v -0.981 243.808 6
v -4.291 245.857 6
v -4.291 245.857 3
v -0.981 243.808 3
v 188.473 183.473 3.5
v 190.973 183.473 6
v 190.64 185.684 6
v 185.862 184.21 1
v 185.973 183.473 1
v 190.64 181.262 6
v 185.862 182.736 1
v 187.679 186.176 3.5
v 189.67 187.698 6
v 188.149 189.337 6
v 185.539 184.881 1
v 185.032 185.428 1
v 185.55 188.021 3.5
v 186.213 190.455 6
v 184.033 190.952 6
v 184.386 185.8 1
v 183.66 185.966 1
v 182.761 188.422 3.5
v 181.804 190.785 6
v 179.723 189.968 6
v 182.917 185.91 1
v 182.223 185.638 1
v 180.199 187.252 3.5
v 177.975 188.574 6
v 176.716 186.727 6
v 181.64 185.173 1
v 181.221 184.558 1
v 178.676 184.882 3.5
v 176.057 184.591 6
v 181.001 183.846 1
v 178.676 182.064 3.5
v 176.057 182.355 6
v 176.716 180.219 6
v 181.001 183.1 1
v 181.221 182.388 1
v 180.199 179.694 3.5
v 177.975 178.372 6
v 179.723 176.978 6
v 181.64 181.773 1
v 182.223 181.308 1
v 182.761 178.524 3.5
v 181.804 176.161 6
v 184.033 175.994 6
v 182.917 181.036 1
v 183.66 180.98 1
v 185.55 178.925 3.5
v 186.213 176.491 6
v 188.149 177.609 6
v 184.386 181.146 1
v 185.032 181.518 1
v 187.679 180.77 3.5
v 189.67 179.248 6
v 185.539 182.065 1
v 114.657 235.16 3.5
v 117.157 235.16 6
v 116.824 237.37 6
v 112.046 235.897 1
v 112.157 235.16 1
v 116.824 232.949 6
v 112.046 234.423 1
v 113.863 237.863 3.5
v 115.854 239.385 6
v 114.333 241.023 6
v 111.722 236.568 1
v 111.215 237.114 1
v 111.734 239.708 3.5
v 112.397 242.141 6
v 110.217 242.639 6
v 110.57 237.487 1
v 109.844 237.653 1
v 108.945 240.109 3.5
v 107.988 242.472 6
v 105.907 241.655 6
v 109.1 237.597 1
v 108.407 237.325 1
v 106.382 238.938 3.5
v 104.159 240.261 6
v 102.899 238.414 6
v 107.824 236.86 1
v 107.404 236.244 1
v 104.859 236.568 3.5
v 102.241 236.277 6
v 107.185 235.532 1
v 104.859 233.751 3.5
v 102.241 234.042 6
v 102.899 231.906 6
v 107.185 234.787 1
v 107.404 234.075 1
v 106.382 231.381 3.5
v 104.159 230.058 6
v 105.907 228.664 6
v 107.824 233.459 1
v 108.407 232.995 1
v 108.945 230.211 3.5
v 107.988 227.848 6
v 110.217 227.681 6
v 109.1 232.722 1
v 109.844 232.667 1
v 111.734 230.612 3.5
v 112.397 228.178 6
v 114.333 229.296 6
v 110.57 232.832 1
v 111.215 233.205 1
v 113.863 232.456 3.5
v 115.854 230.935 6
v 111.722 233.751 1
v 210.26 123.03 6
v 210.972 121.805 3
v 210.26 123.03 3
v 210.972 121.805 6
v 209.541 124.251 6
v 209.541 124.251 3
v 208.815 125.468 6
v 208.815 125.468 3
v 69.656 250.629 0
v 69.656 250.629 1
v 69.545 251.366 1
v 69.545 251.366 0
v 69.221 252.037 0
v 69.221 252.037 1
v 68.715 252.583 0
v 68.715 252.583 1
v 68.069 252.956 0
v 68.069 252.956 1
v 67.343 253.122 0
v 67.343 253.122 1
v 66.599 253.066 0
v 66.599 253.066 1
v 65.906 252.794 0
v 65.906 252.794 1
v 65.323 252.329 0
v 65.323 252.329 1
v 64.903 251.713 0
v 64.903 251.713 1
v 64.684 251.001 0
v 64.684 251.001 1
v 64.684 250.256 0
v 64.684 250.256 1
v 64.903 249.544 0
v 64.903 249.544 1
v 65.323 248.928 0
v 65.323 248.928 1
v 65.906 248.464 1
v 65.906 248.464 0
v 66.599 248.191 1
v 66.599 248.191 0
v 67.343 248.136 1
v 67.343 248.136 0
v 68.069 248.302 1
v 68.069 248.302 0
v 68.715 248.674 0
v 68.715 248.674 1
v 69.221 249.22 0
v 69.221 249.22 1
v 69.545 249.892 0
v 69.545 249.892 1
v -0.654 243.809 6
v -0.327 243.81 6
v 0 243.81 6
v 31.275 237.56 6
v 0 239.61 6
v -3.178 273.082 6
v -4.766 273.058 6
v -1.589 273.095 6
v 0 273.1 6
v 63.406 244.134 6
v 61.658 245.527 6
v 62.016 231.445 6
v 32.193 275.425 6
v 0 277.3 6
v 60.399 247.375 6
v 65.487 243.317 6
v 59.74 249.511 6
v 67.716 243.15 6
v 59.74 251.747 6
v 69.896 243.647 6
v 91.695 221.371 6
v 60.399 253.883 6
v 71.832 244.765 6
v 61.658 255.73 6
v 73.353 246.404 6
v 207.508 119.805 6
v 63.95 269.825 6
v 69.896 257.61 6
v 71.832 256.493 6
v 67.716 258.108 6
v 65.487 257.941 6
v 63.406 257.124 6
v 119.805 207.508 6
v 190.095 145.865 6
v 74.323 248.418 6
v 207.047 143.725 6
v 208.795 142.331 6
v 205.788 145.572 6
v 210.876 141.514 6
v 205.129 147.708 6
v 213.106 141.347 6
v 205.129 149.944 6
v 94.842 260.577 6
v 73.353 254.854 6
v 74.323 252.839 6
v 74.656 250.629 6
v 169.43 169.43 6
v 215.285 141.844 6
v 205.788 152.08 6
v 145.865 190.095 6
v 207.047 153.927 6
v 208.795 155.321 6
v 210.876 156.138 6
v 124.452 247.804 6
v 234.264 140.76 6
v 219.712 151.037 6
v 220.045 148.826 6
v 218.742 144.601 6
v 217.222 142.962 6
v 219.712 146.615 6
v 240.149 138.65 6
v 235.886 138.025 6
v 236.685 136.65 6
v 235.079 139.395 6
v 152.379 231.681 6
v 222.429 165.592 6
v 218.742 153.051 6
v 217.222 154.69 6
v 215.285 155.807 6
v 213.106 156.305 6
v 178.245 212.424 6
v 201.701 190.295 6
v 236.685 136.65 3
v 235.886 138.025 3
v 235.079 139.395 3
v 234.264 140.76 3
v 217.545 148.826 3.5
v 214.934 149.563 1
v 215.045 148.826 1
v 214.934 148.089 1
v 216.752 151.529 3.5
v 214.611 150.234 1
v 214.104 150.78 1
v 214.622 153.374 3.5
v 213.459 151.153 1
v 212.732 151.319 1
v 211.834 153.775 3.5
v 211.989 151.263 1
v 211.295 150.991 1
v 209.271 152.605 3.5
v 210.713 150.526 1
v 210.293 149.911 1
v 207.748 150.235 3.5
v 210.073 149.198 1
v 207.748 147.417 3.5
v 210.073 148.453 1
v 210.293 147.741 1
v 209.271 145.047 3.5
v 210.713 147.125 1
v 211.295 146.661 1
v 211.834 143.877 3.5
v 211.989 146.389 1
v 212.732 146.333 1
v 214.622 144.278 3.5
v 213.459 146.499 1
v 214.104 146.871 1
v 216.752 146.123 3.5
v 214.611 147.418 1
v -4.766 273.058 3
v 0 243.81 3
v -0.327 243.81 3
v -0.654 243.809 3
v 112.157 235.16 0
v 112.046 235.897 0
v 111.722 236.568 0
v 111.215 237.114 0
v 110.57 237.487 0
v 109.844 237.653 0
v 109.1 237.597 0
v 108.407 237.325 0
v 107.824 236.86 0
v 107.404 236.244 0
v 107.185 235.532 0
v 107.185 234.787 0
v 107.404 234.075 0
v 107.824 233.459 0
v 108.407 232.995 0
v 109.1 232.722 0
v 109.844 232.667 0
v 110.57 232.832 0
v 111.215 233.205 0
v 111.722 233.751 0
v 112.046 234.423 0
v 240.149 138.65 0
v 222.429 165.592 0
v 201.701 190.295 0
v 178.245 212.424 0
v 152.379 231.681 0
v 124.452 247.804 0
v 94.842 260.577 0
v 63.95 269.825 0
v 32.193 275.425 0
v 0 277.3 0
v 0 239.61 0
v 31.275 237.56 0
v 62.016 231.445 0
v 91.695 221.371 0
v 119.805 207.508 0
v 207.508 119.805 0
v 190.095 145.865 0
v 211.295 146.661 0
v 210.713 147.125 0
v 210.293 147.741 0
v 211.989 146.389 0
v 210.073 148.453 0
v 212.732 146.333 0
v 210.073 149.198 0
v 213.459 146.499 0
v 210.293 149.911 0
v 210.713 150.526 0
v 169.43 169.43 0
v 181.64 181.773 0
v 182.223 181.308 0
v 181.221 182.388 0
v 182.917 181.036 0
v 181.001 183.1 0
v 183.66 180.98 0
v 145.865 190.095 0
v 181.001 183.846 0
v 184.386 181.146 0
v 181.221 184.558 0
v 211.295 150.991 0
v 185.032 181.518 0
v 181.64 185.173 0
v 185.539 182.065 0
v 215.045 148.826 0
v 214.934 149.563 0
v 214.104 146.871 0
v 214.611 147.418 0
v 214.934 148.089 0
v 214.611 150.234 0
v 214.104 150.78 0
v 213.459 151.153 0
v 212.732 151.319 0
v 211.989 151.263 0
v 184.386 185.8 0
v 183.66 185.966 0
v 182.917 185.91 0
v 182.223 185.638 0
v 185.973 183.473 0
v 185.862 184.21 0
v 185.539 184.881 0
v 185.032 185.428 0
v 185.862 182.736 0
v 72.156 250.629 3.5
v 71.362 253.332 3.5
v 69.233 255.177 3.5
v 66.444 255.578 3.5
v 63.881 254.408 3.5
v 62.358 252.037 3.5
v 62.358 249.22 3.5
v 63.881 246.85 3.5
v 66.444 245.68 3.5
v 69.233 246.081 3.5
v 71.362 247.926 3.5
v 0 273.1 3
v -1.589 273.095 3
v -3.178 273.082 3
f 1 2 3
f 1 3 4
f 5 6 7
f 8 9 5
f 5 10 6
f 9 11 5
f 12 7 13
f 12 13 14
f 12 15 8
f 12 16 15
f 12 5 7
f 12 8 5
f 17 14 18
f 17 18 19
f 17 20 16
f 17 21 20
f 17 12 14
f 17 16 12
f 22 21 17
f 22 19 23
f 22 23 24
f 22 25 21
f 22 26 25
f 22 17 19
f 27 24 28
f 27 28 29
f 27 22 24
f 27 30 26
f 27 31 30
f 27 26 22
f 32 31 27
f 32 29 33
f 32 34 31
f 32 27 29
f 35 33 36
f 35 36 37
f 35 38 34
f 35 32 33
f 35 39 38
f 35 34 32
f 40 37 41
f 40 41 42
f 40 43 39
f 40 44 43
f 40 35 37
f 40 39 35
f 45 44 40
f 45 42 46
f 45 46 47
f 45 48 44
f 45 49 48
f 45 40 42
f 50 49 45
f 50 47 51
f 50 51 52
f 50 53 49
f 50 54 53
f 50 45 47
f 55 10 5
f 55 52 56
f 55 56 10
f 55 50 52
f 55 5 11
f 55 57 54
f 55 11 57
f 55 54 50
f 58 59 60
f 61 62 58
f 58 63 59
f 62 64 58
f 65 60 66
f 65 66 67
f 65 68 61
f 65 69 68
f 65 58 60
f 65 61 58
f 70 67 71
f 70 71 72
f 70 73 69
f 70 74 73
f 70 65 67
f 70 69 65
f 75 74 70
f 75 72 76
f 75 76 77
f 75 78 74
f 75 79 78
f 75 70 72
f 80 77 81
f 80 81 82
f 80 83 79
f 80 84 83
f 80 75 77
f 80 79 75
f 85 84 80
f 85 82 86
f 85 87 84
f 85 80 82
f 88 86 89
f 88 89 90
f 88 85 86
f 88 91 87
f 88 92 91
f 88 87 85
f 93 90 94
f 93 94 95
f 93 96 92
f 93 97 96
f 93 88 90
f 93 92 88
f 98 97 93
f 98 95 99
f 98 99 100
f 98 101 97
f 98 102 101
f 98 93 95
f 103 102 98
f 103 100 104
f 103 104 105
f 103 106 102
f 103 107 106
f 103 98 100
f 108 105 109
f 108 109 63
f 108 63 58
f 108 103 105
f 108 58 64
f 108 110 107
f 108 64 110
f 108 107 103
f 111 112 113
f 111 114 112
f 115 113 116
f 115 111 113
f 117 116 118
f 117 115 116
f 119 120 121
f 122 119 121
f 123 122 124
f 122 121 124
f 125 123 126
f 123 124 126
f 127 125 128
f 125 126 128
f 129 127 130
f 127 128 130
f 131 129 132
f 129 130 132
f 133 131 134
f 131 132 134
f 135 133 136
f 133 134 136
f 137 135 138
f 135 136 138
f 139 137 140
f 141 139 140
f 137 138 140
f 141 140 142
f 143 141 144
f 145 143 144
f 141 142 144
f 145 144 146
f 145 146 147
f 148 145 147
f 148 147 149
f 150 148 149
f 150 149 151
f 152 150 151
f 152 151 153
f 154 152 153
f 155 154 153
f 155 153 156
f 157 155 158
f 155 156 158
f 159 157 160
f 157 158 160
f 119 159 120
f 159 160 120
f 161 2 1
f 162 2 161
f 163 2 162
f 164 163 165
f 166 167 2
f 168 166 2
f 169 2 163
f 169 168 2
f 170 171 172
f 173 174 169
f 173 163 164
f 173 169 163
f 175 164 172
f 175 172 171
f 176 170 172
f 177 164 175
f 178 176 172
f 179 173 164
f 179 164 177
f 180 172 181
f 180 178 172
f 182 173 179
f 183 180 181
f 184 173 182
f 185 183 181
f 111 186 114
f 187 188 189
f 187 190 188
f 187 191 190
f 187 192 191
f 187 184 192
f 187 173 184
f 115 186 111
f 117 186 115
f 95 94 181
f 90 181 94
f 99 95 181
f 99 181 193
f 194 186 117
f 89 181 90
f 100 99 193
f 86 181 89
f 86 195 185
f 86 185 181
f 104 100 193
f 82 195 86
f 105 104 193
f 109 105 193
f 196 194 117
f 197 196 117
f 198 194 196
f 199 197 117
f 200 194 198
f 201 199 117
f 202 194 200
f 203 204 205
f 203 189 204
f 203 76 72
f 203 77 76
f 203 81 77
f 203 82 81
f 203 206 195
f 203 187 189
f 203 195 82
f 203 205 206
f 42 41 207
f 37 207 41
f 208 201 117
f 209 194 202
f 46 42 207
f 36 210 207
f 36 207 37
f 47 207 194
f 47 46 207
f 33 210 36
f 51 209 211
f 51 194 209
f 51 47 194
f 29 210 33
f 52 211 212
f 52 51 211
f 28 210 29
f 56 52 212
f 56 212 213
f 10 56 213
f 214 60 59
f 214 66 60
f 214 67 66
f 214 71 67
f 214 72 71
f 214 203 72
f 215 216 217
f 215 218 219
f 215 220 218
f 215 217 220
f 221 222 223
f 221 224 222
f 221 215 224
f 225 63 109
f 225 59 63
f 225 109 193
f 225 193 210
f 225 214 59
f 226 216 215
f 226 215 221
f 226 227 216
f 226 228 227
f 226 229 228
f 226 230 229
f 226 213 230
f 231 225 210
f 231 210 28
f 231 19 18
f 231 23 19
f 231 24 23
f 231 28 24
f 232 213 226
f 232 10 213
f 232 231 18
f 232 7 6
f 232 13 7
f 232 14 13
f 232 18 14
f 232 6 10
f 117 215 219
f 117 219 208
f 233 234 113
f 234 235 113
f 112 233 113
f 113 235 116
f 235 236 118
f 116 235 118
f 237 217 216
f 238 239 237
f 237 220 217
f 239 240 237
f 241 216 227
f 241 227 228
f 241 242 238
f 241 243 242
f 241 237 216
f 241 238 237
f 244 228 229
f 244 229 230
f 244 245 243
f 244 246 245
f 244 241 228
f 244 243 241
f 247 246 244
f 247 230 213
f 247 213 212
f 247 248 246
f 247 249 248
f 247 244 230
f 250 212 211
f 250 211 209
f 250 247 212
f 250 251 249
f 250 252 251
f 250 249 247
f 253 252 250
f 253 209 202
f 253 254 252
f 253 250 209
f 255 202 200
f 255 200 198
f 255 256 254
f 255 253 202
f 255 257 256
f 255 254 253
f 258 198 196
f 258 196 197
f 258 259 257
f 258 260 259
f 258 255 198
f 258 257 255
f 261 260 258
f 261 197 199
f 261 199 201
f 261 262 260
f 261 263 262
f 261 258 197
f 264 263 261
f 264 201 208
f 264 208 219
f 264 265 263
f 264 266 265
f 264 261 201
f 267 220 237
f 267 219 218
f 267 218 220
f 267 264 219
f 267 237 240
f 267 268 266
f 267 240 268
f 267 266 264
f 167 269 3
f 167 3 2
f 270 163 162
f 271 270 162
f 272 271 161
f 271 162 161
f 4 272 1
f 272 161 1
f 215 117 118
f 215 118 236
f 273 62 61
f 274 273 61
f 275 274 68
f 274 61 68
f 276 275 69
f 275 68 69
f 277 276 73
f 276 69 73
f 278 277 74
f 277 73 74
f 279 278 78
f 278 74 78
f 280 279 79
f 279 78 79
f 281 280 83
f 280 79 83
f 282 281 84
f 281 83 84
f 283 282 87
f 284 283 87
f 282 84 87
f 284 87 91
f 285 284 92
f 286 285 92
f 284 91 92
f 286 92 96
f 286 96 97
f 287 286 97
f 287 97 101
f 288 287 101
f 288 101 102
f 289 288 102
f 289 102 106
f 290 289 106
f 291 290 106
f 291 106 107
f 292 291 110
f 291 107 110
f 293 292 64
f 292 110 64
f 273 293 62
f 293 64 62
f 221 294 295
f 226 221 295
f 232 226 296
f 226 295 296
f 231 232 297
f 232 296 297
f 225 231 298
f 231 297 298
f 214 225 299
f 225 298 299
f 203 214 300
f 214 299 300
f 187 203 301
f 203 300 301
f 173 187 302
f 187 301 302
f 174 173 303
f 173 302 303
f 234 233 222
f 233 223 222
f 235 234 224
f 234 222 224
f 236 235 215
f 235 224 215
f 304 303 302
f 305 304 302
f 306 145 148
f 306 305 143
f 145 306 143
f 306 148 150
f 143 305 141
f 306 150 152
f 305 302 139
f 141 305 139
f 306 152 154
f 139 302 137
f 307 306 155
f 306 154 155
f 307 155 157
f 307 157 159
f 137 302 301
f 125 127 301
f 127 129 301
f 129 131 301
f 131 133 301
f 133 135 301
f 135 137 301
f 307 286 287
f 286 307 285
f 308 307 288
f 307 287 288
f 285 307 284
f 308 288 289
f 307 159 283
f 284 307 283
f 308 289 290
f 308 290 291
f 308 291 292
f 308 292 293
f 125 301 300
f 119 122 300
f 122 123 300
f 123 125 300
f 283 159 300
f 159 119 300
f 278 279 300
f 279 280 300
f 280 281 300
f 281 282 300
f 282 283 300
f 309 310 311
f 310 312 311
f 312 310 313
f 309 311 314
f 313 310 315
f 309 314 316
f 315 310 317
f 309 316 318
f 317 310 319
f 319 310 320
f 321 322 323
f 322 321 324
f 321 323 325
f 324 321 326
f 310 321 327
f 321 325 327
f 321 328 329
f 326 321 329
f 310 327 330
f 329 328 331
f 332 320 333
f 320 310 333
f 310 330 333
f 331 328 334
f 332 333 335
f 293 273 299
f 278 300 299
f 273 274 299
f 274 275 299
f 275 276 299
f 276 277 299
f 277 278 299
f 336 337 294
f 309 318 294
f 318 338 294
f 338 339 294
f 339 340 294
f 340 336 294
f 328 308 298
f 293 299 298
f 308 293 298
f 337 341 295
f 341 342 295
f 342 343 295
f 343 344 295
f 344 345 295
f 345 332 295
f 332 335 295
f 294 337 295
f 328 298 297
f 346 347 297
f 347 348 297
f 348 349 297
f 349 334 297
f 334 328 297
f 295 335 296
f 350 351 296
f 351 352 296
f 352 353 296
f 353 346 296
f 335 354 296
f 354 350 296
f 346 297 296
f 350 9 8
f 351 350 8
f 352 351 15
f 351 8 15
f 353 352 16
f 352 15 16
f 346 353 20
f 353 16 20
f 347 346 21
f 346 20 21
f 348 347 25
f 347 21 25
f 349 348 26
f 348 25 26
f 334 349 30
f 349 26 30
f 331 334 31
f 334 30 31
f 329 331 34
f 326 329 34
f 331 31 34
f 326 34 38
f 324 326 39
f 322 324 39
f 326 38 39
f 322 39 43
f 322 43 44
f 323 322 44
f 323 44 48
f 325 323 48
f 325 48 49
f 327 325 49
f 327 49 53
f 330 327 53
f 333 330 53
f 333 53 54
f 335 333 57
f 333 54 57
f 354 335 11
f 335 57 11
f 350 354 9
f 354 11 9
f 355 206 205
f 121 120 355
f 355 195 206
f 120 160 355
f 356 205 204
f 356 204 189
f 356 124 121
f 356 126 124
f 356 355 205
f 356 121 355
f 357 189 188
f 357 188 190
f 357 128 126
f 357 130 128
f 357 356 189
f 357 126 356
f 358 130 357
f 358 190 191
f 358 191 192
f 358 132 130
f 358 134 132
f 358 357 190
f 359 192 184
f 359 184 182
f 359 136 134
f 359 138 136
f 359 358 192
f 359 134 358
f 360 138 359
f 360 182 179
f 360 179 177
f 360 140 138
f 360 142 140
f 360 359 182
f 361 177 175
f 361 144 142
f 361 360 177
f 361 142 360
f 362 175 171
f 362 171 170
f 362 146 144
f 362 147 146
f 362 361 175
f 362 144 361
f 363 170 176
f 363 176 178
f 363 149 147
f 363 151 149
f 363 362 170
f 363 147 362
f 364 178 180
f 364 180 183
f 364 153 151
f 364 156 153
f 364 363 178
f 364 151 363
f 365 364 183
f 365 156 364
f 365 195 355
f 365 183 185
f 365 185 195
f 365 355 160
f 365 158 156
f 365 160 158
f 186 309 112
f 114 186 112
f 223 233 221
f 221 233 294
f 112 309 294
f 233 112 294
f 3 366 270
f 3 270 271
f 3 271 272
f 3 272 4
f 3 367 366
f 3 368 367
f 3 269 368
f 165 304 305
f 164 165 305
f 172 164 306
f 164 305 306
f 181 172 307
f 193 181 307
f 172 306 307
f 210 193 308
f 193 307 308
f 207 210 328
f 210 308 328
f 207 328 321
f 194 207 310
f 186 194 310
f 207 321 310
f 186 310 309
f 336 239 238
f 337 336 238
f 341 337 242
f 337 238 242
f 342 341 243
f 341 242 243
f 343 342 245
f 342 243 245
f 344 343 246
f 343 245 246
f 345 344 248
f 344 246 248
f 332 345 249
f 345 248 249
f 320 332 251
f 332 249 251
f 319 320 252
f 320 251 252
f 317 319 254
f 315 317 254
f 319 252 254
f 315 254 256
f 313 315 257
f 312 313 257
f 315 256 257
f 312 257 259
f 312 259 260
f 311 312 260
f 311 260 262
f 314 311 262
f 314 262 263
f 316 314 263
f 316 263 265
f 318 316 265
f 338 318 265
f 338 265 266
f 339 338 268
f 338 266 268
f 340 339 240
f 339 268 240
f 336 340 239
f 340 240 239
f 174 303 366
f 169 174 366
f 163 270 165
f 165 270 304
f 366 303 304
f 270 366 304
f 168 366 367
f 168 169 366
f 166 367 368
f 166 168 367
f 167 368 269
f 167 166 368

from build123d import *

# Parameters (mm, degrees)
BOSS_EXTRU_1_DEPTH                      = 6
ESQUISSE2_R                             = 2.5
ENL_V_MAT_EXTRU_1_DEPTH                 = 6
CHANFREIN1_SIZE                         = 5
ESQUISSE6_W                             = 29.69
ESQUISSE6_H                             = 3
ENL_VEMENT_DE_MATI_RE_R_VOLUTION1_ANGLE = 1
ESQUISSE7_W                             = 3
ESQUISSE7_H                             = 29.29
R_VOLUTION2_ANGLE                       = 1
ENL_V_MAT_EXTRU_2_DEPTH                 = 10


with BuildPart() as part:
    # Esquisse1 → Boss.-Extru.1 (new body)
    with BuildSketch(Plane.XY):
        with BuildLine():
            Line((0, 277.3), (0, 239.61))
            ThreePointArc((0, 239.61), (119.805, 207.508347001), (207.508347001, 119.805))
            Line((207.508347001, 119.805), (240.148844469, 138.65))
            ThreePointArc((240.148844469, 138.65), (138.65, 240.148844469), (0, 277.3))
        make_face()
    extrude(amount=BOSS_EXTRU_1_DEPTH)

    # Esquisse2 → Enlèv. mat.-Extru.1 (cut)
    with BuildSketch(Plane.XY.offset(6)):
        with Locations((67.155777633, 250.628774147)):
            Circle(ESQUISSE2_R)
        with Locations((109.656760374, 235.159681502)):
            Circle(ESQUISSE2_R)
        with Locations((212.545380932, 148.82587794)):
            Circle(ESQUISSE2_R)
        with Locations((183.472996514, 183.472996514)):
            Circle(ESQUISSE2_R)
    extrude(amount=-ENL_V_MAT_EXTRU_1_DEPTH, mode=Mode.SUBTRACT)

    # Chanfrein1
    chanfrein1_edges = [part.edges().sort_by_distance(p)[0] for p in [
        (64.655777633, 250.628774147, 6),
        (107.156760374, 235.159681502, 6),
        (180.972996514, 183.472996514, 6),
        (210.045380932, 148.82587794, 6),
    ]]
    chamfer(chanfrein1_edges, length=CHANFREIN1_SIZE)

    # Esquisse6 → Enlèvement de matière-Révolution1 (revolve, cut)
    with BuildSketch(Plane(origin=(0, 0, 0), x_dir=(0.8660254037844394, 0.49999999999999883, 0), z_dir=(0.49999999999999883, -0.8660254037844394, 0))):
        with Locations((258.455, 4.5)):
            Rectangle(ESQUISSE6_W, ESQUISSE6_H)
    revolve(axis=Axis((0, 0, 0), (0, 0, 1)), revolution_arc=ENL_VEMENT_DE_MATI_RE_R_VOLUTION1_ANGLE, mode=Mode.SUBTRACT)

    # Esquisse7 → Révolution2 (revolve)
    with BuildSketch(Plane.ZY):
        with Locations((4.5, 258.455)):
            Rectangle(ESQUISSE7_W, ESQUISSE7_H)
    revolve(axis=Axis((0, 0, 0), (0, 0, 1)), revolution_arc=R_VOLUTION2_ANGLE)

    # Esquisse8 → Enlèv. mat.-Extru.2 (cut)
    with BuildSketch(Plane.XY.offset(6)):
        Polygon((-4.291451908, 245.857115173), (-0.980595059, 243.808028033), (-4.255071213, 243.772866556), align=None)
    extrude(amount=-ENL_V_MAT_EXTRU_2_DEPTH, mode=Mode.SUBTRACT)


solid = part.part
